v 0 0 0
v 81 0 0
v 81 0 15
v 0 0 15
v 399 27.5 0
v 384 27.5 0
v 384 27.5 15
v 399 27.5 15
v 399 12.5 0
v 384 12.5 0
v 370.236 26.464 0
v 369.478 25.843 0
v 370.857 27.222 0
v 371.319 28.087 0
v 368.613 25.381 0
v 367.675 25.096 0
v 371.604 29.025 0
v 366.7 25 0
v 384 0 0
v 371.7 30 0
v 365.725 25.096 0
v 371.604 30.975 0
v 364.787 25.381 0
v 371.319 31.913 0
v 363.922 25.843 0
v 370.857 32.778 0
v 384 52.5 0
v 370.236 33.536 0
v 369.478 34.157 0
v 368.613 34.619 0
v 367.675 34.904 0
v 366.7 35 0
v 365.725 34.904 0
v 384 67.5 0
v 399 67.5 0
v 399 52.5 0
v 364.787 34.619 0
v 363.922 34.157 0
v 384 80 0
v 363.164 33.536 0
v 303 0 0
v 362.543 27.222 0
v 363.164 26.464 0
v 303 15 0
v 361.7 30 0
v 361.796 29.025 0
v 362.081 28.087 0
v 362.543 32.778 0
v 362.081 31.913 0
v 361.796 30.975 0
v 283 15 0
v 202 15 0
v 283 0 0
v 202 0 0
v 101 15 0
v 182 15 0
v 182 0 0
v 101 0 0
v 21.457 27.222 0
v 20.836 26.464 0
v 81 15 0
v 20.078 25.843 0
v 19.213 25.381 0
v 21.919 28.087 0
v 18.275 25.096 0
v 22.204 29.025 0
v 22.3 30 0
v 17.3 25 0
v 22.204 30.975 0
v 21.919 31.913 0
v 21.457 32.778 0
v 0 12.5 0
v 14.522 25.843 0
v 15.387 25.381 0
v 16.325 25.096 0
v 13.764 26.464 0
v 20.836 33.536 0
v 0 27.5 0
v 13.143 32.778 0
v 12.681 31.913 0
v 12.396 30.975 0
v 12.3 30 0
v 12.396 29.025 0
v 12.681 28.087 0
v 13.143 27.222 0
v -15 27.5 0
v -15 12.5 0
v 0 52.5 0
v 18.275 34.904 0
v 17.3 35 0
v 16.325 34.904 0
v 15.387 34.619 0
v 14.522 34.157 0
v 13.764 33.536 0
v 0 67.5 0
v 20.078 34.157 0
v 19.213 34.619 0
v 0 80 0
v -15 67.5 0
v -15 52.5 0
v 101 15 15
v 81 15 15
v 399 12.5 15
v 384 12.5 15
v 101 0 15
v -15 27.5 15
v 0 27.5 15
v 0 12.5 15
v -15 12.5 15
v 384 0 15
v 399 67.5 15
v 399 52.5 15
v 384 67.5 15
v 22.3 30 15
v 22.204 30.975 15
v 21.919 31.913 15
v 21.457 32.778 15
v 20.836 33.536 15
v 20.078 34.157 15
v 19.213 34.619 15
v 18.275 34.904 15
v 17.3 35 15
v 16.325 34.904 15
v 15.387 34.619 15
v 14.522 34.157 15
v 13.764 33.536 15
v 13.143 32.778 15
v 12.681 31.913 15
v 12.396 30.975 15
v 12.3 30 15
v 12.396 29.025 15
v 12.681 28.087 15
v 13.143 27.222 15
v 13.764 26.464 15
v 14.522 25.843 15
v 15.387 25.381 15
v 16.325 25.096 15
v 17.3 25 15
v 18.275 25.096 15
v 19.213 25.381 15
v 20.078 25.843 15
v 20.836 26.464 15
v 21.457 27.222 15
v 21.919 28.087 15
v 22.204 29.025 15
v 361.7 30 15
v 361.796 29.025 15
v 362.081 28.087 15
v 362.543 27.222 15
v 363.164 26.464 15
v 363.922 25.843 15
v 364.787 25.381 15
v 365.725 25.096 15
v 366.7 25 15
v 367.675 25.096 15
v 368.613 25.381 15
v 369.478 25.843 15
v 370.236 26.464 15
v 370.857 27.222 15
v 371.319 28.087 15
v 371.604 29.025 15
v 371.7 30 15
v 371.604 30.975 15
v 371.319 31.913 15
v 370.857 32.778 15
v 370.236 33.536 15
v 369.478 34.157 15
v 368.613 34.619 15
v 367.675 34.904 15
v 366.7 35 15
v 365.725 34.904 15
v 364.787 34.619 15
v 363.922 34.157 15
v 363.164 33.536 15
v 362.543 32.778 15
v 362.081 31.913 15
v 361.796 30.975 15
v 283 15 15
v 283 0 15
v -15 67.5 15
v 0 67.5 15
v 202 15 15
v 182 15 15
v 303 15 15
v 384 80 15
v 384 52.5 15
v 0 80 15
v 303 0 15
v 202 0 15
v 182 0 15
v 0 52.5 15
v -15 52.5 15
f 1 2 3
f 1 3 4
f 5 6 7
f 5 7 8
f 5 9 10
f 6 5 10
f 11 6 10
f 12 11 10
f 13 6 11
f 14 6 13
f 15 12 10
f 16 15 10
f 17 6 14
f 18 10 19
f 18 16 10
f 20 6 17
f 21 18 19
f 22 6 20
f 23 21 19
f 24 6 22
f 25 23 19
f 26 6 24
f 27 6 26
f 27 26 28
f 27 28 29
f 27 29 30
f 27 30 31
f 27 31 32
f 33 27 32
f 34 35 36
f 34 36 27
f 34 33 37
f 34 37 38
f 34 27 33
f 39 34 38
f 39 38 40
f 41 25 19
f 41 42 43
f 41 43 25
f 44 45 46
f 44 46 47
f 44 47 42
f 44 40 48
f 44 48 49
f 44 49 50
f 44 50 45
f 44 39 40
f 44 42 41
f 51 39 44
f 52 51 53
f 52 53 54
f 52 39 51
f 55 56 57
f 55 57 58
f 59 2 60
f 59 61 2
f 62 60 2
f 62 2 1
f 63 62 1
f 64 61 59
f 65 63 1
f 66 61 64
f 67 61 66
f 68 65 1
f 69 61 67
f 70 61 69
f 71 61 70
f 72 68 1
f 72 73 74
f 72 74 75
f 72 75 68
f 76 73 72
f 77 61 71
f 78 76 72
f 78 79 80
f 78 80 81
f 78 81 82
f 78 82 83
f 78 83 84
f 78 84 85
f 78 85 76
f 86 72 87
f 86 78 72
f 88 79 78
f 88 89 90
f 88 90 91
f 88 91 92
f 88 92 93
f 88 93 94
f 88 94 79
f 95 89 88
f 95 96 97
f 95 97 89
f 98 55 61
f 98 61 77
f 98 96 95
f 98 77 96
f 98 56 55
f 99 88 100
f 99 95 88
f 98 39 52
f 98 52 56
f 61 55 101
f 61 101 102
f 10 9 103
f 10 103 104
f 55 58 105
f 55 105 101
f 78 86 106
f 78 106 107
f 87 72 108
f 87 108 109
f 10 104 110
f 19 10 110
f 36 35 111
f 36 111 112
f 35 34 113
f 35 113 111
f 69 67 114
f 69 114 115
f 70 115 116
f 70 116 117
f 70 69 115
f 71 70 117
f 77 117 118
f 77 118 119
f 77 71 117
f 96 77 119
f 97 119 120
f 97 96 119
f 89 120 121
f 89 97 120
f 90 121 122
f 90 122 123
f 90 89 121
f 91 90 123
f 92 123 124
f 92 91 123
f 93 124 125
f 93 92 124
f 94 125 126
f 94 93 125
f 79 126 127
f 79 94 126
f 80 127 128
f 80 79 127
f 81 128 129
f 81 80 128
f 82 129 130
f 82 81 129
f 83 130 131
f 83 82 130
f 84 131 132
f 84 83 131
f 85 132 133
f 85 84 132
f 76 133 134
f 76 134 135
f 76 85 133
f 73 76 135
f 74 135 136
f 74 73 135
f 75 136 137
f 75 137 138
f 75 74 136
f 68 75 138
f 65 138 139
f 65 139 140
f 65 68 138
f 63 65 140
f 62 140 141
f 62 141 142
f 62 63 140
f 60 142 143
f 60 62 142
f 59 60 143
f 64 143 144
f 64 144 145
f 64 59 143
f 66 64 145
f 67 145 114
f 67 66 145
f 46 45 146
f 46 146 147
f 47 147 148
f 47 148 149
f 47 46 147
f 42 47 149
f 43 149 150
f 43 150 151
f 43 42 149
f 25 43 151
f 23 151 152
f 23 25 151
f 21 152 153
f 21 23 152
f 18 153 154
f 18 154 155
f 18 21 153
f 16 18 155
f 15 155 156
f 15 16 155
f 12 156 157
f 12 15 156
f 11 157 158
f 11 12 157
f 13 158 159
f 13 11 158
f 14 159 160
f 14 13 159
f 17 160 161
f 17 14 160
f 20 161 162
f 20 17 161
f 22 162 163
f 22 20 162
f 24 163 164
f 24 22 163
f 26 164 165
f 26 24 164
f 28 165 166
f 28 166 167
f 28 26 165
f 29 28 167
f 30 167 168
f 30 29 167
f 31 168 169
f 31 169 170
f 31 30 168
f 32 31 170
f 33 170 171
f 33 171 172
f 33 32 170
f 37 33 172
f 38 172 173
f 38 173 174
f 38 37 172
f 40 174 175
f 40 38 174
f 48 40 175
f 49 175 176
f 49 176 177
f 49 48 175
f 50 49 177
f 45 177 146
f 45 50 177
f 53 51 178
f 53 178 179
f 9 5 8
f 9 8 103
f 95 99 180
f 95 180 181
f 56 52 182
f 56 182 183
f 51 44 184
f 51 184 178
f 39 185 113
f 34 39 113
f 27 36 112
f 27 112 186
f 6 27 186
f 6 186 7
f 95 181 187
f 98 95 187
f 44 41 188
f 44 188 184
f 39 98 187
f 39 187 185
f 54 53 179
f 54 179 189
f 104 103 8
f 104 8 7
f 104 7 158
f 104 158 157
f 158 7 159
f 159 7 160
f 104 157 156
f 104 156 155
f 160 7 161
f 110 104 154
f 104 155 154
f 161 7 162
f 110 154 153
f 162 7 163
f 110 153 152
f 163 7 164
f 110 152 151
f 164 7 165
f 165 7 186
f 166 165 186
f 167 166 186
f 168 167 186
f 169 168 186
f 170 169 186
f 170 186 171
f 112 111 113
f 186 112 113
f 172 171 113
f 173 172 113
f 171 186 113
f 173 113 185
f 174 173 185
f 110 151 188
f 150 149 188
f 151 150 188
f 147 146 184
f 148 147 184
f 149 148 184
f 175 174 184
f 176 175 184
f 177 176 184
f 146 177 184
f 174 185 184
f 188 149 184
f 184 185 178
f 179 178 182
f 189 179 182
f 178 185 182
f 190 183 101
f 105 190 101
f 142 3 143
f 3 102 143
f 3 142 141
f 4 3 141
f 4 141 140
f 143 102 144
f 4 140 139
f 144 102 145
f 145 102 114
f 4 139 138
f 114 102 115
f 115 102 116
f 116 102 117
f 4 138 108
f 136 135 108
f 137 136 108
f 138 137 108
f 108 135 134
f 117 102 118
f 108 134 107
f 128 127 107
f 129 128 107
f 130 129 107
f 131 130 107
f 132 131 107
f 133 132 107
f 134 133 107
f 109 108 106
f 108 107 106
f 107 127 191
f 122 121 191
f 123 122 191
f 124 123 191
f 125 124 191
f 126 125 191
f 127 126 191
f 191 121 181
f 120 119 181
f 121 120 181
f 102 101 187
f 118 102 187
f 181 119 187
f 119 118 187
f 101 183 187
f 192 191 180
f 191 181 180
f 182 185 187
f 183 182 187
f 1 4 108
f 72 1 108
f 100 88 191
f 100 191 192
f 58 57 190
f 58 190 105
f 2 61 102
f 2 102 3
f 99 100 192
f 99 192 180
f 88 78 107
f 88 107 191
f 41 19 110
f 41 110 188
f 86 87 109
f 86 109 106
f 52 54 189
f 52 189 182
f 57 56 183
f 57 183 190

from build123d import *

# Parameters (mm, degrees)
SKETCH1_R           = 5
BOSS_EXTRUDE1_DEPTH = 15


with BuildPart() as part:
    # Sketch1 → Boss-Extrude1 (new body)
    with BuildSketch(Plane.XY):
        Polygon((0, 0), (0, 12.5), (-15, 12.5), (-15, 27.5), (0, 27.5), (0, 52.5), (-15, 52.5), (-15, 67.5), (0, 67.5), (0, 80), (384, 80), (384, 67.5), (399, 67.5), (399, 52.5), (384, 52.5), (384, 27.5), (399, 27.5), (399, 12.5), (384, 12.5), (384, 0), (303, 0), (303, 15), (283, 15), (283, 0), (202, 0), (202, 15), (182, 15), (182, 0), (101, 0), (101, 15), (81, 15), (81, 0), align=None)
        with Locations((17.3, 30)):
            Circle(SKETCH1_R, mode=Mode.SUBTRACT)
        with Locations(Location((366.7, 30, 0), (0, 0, 180))):  # turned: the seam where the file's is
            Circle(SKETCH1_R, mode=Mode.SUBTRACT)
    extrude(amount=BOSS_EXTRUDE1_DEPTH)


solid = part.part
